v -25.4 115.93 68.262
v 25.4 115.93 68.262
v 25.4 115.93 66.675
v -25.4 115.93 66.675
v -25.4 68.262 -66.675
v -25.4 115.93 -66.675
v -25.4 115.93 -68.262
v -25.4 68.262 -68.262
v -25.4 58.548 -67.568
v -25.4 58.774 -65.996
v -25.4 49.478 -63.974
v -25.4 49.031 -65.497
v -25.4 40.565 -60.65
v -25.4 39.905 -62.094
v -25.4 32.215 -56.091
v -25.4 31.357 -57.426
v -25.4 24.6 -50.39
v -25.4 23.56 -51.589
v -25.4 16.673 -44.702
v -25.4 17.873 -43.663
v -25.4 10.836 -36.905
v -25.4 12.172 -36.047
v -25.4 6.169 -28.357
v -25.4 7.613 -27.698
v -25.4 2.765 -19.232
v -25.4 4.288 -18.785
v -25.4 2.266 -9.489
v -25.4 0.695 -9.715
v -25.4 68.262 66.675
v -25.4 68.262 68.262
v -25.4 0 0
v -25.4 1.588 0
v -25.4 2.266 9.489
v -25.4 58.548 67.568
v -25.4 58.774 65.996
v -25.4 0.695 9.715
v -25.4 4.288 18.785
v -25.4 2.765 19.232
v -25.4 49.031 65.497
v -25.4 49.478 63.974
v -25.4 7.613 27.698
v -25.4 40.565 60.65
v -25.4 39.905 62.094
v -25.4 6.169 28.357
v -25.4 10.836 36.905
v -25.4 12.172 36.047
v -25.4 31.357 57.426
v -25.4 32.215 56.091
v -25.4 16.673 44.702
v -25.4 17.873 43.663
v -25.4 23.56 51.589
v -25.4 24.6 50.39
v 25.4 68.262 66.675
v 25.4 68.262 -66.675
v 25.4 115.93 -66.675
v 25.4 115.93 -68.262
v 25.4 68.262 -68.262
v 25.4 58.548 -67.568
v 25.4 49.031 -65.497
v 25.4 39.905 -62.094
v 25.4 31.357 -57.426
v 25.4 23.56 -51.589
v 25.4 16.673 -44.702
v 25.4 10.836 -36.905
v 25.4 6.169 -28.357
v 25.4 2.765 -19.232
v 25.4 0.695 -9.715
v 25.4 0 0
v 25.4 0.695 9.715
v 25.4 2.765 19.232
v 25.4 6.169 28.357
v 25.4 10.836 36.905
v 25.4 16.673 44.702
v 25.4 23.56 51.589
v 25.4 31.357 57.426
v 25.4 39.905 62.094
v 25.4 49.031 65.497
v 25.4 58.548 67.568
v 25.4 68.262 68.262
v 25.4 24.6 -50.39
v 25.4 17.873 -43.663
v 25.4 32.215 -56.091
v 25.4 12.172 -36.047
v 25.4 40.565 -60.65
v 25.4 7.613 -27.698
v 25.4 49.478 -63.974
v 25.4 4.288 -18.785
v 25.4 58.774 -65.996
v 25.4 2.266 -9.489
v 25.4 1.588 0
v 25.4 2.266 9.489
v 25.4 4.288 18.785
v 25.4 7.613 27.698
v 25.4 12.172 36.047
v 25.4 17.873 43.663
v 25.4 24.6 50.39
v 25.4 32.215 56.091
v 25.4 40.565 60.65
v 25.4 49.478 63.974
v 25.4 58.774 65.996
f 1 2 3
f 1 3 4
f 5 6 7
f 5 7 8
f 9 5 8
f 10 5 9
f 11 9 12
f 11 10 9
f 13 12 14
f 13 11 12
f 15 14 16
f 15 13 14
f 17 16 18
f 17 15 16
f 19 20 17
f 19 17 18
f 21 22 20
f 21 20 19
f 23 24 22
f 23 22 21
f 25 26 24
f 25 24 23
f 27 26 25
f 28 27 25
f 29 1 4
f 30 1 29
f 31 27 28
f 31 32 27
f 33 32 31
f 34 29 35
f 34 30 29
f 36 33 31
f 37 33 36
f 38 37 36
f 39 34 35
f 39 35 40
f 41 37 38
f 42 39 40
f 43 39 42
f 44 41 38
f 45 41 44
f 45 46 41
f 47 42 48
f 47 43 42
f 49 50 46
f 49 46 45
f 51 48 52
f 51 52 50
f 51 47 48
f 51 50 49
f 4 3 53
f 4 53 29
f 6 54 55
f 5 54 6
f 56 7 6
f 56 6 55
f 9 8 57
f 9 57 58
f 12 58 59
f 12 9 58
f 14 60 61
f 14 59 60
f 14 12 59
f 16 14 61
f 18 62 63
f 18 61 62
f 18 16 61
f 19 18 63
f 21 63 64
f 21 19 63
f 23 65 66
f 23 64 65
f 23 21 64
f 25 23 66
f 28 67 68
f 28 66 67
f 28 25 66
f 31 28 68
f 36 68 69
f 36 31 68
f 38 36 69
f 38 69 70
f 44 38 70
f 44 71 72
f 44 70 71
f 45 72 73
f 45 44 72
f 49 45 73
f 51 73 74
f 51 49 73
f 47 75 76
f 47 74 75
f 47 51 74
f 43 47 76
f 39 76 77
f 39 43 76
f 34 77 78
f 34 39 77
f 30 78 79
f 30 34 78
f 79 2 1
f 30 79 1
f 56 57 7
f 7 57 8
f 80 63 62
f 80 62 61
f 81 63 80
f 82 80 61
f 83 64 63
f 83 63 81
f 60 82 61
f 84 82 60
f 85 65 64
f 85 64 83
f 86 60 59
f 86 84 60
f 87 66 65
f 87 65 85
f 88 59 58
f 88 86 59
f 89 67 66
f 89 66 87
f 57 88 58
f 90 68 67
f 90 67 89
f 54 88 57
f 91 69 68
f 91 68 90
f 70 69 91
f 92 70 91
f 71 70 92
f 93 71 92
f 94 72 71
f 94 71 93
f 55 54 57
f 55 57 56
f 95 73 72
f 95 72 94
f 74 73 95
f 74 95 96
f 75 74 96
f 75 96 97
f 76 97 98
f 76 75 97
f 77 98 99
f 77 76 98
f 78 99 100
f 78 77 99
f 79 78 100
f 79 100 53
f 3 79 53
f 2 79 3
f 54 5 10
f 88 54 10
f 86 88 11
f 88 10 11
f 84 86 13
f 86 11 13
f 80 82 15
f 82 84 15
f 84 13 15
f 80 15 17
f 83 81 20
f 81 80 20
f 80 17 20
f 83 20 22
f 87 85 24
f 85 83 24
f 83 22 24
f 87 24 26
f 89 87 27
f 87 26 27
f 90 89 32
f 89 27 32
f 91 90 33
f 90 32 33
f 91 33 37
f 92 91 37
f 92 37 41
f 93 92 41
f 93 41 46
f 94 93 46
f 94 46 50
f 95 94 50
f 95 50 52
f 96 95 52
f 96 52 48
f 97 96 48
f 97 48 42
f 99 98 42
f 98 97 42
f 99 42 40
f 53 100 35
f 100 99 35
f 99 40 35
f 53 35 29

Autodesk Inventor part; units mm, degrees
ref_plane "YZ Plane" through (0, 0, 0) normal (1, 0, 0) x (0, 1, 0)
ref_plane "XZ Plane" through (0, 0, 0) normal (0, 1, 0) x (-1, 0, 0)
ref_plane "XY Plane" through (0, 0, 0) normal (0, 0, 1) x (1, 0, 0)
sketch "Sketch1" plane through (0, 0, 0) normal (0, 1, 0) x (-1, 0, 0)
  line L0 (25.4, -152.4) -> (-25.4, -152.4)
  line L1 (-25.4, -152.4) -> (-25.4, 152.4)
  line L2 (-25.4, 152.4) -> (25.4, 152.4)
  line L3 (25.4, 152.4) -> (25.4, -152.4)
  line L4 (25.4, -152.4) -> (-25.4, 152.4) construction
  line L5 (-25.4, -152.4) -> (25.4, 152.4) construction
  point P0 (0, 0)
  dimension "d0" = 50.8
  dimension "d1" = 304.8
extrude "Extrusion1" add sketch "Sketch1" along normal blind 1.5875
sketch "Sketch2" plane through (0, 1.5875, 0) normal (0, 1, 0) x (1, 0, 0)
  line L0 (25.4, -152.4) -> (25.4, 152.4) projected
  line L1 (-54.3689, 0) -> (59.0967, 0)
  line L2 (-25.4, -152.4) -> (25.4, 152.4) construction
  line L3 (-25.4, 152.4) -> (25.4, -152.4) construction
  point P0 (0, 0)
  point P1 (0, 0)
bend part "Bend Part1" radius 66.675 angle 180 line through (-54.3689, 1.5875, 0) along (1, 0, 0) centre toward (0, 1, 0) moving side (0, 0, -1) both sides yes
properties part number "side" material "Polycarbonate, Clear"
